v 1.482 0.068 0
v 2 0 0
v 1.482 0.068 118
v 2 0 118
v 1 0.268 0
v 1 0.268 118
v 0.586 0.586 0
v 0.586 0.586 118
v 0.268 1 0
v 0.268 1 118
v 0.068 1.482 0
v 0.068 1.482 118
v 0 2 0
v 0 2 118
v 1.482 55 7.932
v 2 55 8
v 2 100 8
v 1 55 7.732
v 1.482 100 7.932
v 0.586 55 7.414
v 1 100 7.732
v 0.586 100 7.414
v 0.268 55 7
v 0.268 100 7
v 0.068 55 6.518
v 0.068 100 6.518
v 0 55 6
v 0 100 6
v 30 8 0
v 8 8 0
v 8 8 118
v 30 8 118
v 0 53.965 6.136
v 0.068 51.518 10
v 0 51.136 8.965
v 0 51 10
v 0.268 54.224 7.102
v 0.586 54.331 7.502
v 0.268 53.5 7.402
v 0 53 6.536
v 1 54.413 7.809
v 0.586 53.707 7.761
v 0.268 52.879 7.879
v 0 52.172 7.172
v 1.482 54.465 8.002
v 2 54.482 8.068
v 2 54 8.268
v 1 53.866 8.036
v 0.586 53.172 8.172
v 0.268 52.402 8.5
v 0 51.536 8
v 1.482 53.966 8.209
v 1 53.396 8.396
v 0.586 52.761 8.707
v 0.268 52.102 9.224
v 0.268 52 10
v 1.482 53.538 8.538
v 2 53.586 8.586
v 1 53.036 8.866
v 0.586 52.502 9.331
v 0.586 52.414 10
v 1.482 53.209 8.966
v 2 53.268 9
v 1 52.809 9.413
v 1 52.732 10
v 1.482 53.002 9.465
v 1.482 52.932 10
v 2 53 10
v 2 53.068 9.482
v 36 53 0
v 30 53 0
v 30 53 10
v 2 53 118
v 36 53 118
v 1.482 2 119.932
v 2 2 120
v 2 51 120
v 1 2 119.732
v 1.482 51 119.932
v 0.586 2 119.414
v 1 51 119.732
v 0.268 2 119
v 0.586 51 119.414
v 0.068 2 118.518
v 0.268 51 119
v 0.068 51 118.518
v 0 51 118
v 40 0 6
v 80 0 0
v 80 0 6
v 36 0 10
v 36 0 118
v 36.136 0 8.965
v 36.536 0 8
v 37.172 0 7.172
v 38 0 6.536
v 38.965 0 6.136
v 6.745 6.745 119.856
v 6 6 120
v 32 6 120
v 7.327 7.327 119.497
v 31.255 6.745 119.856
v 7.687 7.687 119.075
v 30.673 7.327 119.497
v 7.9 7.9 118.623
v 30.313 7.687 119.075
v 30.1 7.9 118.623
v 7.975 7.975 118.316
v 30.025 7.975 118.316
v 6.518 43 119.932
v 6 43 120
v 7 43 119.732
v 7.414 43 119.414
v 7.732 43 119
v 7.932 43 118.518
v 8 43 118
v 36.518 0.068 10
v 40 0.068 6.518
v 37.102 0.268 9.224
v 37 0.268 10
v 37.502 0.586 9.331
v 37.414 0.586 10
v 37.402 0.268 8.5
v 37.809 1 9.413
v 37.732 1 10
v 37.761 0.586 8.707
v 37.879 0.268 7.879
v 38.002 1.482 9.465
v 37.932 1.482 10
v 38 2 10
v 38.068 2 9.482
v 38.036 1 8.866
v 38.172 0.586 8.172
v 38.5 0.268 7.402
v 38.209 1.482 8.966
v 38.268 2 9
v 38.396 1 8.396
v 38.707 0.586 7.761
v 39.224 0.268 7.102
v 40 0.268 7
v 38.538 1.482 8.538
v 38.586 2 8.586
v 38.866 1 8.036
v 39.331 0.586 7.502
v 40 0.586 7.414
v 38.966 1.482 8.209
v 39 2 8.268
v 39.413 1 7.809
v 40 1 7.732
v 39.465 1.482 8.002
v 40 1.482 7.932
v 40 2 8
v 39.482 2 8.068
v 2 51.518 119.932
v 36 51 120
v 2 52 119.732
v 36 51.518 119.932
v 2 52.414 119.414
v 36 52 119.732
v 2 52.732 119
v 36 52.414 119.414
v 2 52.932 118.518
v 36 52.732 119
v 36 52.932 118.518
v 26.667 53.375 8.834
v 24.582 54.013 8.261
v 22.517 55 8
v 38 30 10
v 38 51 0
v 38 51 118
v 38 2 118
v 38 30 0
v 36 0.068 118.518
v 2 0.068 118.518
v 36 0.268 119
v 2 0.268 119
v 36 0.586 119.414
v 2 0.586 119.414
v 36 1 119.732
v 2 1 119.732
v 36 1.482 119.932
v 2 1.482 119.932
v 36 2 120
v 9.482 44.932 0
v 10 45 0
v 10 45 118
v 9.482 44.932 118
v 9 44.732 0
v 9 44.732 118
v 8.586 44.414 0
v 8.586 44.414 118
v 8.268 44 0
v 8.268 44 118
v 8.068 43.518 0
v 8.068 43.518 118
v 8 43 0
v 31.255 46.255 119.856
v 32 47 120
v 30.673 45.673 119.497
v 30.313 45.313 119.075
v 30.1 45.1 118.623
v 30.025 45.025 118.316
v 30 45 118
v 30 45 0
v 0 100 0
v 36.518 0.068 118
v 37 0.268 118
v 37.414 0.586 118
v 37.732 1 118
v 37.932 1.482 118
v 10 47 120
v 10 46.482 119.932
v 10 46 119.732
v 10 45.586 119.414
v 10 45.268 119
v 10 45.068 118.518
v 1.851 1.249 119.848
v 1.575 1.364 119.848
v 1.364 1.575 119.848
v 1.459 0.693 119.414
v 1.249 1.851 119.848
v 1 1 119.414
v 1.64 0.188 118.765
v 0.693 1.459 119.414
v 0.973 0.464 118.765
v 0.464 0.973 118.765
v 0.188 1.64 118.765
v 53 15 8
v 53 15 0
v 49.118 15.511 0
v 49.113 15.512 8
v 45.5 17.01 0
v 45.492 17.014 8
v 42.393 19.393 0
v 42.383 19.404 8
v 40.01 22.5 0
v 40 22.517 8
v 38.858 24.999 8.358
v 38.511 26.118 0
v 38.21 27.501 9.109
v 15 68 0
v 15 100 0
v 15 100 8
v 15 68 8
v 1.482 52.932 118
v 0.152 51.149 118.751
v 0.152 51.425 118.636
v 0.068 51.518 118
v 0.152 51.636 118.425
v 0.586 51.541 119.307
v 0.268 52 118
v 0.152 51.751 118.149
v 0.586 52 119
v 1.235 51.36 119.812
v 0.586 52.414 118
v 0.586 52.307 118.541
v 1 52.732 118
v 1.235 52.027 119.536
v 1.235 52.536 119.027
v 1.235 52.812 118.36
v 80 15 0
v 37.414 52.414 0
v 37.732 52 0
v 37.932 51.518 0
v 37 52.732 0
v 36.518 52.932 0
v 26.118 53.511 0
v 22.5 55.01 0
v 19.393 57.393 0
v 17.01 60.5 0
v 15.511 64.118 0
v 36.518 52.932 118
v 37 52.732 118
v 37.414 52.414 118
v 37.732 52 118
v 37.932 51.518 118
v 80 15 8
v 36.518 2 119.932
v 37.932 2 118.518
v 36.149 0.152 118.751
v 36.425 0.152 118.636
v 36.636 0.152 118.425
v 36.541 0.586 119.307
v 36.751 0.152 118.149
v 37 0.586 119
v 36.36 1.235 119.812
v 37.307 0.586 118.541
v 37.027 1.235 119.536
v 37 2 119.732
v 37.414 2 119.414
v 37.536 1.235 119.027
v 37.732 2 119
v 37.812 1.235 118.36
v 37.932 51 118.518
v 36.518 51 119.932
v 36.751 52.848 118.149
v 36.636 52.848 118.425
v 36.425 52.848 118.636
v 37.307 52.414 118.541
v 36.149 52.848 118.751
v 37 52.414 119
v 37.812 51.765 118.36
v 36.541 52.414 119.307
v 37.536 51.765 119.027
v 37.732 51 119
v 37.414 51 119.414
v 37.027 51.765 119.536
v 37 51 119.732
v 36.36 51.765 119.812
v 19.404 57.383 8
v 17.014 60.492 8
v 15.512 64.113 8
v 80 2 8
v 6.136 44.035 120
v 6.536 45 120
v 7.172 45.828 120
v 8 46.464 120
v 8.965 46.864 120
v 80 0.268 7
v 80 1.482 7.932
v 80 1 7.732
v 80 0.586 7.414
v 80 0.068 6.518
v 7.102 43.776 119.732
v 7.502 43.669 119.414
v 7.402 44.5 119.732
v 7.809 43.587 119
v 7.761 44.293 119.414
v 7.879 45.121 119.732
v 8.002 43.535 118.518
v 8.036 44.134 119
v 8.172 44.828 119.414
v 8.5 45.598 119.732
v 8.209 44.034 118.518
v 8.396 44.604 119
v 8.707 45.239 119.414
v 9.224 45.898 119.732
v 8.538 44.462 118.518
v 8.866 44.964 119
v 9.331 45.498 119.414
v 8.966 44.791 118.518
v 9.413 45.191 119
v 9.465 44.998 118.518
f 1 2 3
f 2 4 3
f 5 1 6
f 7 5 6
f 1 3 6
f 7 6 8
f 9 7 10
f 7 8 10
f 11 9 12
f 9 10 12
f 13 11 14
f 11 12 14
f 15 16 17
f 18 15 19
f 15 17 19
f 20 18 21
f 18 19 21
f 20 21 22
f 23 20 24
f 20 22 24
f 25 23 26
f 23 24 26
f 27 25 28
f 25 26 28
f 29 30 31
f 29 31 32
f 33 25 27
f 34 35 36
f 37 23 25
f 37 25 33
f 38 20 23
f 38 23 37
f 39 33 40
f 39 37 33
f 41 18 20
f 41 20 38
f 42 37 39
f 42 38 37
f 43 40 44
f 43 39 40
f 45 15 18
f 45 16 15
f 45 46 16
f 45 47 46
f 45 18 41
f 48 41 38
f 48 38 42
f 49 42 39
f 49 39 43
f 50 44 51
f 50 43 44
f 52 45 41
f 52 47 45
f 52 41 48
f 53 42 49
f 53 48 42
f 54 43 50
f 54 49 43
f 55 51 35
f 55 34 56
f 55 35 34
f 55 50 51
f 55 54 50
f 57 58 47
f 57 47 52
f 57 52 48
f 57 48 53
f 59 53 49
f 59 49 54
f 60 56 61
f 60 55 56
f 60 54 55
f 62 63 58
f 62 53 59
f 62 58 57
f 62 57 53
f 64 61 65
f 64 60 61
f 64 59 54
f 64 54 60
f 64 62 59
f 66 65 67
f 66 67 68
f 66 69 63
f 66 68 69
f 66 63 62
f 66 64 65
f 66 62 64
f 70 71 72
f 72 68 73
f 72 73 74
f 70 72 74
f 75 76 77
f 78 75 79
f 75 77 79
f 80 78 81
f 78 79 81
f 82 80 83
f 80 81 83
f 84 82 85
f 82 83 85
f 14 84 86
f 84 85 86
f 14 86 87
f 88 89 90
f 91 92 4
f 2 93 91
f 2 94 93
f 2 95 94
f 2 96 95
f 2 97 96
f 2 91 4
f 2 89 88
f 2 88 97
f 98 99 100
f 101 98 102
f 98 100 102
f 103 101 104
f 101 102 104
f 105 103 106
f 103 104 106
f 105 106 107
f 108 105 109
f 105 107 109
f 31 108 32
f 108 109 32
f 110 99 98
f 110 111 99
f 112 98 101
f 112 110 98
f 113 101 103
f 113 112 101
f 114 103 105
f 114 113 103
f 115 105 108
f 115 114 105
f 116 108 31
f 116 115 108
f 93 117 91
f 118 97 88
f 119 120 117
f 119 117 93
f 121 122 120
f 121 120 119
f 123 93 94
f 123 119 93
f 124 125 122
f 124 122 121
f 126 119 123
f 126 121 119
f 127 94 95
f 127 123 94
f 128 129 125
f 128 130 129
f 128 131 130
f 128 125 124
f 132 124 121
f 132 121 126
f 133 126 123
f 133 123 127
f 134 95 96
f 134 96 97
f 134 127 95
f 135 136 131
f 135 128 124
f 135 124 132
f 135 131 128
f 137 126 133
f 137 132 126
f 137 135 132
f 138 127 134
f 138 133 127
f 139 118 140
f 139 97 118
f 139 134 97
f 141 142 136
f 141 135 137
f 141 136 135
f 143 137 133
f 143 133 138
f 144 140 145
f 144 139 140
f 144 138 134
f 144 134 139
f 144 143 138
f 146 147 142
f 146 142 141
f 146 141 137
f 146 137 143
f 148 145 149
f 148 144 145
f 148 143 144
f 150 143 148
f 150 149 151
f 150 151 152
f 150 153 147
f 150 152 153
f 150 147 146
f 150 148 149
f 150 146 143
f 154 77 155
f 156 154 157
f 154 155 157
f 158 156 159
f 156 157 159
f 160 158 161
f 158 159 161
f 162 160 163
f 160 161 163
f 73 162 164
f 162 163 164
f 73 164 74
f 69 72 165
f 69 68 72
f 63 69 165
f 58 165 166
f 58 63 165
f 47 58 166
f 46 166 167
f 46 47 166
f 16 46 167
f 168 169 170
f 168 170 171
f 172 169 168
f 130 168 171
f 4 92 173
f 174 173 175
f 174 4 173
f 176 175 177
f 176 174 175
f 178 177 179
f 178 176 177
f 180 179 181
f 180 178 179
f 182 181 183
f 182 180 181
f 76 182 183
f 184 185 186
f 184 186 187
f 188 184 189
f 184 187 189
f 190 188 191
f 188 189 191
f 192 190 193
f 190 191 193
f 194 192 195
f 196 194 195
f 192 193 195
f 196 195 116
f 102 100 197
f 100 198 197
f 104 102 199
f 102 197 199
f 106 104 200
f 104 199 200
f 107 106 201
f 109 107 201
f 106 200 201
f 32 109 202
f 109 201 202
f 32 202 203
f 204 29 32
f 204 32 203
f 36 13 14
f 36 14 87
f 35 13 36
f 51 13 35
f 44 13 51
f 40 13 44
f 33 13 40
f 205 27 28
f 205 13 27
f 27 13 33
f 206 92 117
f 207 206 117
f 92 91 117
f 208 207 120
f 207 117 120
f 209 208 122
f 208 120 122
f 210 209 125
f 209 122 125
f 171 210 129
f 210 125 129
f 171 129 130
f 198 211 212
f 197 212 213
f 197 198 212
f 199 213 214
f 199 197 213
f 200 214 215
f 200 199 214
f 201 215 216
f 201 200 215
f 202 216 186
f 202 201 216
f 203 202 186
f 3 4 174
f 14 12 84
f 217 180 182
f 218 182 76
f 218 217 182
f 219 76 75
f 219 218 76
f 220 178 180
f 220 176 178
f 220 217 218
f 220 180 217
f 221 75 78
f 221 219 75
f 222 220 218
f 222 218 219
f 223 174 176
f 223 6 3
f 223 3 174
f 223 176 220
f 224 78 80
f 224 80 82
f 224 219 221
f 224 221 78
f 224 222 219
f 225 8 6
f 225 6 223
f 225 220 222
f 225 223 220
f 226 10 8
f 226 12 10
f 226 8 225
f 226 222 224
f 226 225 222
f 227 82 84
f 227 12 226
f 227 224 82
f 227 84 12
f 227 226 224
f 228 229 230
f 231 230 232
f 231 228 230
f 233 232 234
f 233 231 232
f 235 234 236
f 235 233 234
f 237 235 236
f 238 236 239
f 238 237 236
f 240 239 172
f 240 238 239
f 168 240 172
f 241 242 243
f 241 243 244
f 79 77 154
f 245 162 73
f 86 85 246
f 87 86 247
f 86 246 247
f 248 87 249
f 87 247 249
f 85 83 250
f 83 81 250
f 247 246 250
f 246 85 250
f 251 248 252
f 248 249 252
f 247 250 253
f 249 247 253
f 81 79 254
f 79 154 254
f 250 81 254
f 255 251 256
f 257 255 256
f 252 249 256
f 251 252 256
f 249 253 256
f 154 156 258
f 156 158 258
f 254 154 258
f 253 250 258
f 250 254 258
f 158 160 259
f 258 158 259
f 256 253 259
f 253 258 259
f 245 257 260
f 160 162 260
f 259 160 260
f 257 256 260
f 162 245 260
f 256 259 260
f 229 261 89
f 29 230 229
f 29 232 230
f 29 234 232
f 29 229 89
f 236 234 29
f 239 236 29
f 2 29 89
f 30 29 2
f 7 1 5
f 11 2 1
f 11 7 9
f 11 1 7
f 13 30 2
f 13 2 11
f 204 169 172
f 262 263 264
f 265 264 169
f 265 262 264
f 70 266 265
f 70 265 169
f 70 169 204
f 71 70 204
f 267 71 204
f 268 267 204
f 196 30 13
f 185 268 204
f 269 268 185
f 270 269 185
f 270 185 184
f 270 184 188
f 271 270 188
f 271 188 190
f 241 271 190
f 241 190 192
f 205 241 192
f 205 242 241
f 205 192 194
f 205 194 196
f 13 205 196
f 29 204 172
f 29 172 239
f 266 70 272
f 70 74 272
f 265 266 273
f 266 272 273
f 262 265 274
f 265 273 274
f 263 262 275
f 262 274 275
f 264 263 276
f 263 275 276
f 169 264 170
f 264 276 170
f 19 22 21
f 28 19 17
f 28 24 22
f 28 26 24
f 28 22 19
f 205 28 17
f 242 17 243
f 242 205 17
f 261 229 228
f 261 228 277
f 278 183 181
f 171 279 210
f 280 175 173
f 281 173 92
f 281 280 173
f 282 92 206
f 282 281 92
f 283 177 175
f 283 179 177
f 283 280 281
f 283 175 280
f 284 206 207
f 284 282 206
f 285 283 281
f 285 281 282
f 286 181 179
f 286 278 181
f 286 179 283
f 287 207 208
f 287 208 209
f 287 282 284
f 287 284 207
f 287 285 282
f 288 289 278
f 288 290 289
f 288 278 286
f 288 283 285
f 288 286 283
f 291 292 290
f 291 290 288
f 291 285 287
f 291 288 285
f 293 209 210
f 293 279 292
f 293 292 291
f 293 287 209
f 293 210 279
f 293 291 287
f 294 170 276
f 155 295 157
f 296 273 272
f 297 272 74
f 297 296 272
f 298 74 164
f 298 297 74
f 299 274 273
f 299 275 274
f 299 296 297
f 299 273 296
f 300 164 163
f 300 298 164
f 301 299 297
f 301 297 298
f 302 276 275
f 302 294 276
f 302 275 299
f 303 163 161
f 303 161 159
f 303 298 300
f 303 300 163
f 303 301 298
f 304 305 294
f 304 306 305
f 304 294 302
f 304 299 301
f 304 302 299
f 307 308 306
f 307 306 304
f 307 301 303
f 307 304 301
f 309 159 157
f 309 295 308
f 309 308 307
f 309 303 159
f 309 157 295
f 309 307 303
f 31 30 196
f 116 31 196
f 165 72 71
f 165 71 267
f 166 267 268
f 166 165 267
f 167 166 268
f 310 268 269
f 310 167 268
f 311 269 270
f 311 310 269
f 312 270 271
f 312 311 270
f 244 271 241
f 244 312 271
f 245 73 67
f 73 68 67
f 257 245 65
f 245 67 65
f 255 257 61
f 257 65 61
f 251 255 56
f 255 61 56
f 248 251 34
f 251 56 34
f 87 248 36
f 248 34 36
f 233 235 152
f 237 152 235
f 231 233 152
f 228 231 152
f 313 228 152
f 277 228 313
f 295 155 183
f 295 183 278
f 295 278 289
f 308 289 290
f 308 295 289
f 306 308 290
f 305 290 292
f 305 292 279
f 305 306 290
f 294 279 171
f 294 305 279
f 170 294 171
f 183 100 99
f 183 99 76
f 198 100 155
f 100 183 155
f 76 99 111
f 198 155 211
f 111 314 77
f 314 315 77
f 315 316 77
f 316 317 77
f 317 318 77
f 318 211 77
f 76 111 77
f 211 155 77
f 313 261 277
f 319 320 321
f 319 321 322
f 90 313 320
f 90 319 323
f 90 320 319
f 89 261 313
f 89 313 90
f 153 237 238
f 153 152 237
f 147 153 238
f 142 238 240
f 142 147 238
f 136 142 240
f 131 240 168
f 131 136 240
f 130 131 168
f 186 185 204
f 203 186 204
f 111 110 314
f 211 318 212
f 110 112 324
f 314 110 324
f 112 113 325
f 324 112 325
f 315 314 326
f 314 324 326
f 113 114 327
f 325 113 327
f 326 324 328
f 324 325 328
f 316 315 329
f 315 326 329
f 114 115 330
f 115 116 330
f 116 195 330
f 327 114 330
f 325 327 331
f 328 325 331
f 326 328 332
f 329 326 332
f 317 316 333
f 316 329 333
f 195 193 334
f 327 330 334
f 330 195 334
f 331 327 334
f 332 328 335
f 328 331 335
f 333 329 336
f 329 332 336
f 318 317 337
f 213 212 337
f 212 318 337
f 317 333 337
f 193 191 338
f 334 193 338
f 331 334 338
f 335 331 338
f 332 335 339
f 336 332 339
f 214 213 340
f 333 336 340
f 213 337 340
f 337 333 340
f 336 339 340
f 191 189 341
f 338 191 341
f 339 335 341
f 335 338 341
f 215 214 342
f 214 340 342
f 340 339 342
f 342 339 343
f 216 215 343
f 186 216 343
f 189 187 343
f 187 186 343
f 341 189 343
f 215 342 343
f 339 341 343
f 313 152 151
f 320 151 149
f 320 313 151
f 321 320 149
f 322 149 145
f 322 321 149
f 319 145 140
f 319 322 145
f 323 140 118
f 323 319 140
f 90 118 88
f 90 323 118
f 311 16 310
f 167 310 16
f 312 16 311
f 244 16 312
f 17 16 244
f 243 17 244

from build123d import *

# Parameters (mm, degrees)
SZKIC1_W                    = 22
SZKIC1_H                    = 37
DODANIE_WYCI_GNI_CIE1_DEPTH = 120
SZKIC2_W                    = 42
SZKIC2_H                    = 15
SZKIC2_W_2                  = 15
SZKIC2_H_2                  = 47
WYTNIJ_WYCI_GNI_CIE1_DEPTH  = 112
ZAOKR_GLENIE1_R             = 15
ZAOKR_GLENIE2_R             = 2


with BuildPart() as part:
    # Szkic1 → Dodanie-wyciągnięcie1 (new body)
    with BuildSketch(Plane.XY):
        Polygon((0, 0), (0, 100), (15, 100), (15, 53), (38, 53), (38, 15), (80, 15), (80, 0), align=None)
        with Locations((19, 26.5)):
            Rectangle(SZKIC1_W, SZKIC1_H, mode=Mode.SUBTRACT)
    extrude(amount=DODANIE_WYCI_GNI_CIE1_DEPTH)

    # Szkic2 → Wytnij-wyciągnięcie1 (cut)
    with BuildSketch(Plane.XY.offset(120)):
        with Locations((59, 7.5)):
            Rectangle(SZKIC2_W, SZKIC2_H)
        with Locations((7.5, 76.5)):
            Rectangle(SZKIC2_W_2, SZKIC2_H_2)
    extrude(amount=-WYTNIJ_WYCI_GNI_CIE1_DEPTH, mode=Mode.SUBTRACT)

    # Zaokrąglenie1
    zaokr_glenie1_edges = [part.edges().sort_by_distance(p)[0] for p in [
        (38, 15, 4),
        (15, 53, 4),
    ]]
    fillet(zaokr_glenie1_edges, radius=ZAOKR_GLENIE1_R)

    # Zaokrąglenie2
    zaokr_glenie2_edges = [part.edges().sort_by_distance(p)[0] for p in [
        (38, 26.5, 120),
        (0, 0, 60),
        (38, 53, 60),
        (19, 53, 120),
        (8, 45, 60),
        (8, 26.5, 120),
        (19, 8, 120),
        (30, 26.5, 120),
        (19, 45, 120),
        (19, 0, 120),
        (38, 22.5, 8),
        (38, 0, 64),
        (59, 0, 8),
        (0, 26.5, 120),
        (0, 76.5, 8),
        (0, 53, 64),
        (22.5, 53, 8),
    ]]
    fillet(zaokr_glenie2_edges, radius=ZAOKR_GLENIE2_R)


solid = part.part
